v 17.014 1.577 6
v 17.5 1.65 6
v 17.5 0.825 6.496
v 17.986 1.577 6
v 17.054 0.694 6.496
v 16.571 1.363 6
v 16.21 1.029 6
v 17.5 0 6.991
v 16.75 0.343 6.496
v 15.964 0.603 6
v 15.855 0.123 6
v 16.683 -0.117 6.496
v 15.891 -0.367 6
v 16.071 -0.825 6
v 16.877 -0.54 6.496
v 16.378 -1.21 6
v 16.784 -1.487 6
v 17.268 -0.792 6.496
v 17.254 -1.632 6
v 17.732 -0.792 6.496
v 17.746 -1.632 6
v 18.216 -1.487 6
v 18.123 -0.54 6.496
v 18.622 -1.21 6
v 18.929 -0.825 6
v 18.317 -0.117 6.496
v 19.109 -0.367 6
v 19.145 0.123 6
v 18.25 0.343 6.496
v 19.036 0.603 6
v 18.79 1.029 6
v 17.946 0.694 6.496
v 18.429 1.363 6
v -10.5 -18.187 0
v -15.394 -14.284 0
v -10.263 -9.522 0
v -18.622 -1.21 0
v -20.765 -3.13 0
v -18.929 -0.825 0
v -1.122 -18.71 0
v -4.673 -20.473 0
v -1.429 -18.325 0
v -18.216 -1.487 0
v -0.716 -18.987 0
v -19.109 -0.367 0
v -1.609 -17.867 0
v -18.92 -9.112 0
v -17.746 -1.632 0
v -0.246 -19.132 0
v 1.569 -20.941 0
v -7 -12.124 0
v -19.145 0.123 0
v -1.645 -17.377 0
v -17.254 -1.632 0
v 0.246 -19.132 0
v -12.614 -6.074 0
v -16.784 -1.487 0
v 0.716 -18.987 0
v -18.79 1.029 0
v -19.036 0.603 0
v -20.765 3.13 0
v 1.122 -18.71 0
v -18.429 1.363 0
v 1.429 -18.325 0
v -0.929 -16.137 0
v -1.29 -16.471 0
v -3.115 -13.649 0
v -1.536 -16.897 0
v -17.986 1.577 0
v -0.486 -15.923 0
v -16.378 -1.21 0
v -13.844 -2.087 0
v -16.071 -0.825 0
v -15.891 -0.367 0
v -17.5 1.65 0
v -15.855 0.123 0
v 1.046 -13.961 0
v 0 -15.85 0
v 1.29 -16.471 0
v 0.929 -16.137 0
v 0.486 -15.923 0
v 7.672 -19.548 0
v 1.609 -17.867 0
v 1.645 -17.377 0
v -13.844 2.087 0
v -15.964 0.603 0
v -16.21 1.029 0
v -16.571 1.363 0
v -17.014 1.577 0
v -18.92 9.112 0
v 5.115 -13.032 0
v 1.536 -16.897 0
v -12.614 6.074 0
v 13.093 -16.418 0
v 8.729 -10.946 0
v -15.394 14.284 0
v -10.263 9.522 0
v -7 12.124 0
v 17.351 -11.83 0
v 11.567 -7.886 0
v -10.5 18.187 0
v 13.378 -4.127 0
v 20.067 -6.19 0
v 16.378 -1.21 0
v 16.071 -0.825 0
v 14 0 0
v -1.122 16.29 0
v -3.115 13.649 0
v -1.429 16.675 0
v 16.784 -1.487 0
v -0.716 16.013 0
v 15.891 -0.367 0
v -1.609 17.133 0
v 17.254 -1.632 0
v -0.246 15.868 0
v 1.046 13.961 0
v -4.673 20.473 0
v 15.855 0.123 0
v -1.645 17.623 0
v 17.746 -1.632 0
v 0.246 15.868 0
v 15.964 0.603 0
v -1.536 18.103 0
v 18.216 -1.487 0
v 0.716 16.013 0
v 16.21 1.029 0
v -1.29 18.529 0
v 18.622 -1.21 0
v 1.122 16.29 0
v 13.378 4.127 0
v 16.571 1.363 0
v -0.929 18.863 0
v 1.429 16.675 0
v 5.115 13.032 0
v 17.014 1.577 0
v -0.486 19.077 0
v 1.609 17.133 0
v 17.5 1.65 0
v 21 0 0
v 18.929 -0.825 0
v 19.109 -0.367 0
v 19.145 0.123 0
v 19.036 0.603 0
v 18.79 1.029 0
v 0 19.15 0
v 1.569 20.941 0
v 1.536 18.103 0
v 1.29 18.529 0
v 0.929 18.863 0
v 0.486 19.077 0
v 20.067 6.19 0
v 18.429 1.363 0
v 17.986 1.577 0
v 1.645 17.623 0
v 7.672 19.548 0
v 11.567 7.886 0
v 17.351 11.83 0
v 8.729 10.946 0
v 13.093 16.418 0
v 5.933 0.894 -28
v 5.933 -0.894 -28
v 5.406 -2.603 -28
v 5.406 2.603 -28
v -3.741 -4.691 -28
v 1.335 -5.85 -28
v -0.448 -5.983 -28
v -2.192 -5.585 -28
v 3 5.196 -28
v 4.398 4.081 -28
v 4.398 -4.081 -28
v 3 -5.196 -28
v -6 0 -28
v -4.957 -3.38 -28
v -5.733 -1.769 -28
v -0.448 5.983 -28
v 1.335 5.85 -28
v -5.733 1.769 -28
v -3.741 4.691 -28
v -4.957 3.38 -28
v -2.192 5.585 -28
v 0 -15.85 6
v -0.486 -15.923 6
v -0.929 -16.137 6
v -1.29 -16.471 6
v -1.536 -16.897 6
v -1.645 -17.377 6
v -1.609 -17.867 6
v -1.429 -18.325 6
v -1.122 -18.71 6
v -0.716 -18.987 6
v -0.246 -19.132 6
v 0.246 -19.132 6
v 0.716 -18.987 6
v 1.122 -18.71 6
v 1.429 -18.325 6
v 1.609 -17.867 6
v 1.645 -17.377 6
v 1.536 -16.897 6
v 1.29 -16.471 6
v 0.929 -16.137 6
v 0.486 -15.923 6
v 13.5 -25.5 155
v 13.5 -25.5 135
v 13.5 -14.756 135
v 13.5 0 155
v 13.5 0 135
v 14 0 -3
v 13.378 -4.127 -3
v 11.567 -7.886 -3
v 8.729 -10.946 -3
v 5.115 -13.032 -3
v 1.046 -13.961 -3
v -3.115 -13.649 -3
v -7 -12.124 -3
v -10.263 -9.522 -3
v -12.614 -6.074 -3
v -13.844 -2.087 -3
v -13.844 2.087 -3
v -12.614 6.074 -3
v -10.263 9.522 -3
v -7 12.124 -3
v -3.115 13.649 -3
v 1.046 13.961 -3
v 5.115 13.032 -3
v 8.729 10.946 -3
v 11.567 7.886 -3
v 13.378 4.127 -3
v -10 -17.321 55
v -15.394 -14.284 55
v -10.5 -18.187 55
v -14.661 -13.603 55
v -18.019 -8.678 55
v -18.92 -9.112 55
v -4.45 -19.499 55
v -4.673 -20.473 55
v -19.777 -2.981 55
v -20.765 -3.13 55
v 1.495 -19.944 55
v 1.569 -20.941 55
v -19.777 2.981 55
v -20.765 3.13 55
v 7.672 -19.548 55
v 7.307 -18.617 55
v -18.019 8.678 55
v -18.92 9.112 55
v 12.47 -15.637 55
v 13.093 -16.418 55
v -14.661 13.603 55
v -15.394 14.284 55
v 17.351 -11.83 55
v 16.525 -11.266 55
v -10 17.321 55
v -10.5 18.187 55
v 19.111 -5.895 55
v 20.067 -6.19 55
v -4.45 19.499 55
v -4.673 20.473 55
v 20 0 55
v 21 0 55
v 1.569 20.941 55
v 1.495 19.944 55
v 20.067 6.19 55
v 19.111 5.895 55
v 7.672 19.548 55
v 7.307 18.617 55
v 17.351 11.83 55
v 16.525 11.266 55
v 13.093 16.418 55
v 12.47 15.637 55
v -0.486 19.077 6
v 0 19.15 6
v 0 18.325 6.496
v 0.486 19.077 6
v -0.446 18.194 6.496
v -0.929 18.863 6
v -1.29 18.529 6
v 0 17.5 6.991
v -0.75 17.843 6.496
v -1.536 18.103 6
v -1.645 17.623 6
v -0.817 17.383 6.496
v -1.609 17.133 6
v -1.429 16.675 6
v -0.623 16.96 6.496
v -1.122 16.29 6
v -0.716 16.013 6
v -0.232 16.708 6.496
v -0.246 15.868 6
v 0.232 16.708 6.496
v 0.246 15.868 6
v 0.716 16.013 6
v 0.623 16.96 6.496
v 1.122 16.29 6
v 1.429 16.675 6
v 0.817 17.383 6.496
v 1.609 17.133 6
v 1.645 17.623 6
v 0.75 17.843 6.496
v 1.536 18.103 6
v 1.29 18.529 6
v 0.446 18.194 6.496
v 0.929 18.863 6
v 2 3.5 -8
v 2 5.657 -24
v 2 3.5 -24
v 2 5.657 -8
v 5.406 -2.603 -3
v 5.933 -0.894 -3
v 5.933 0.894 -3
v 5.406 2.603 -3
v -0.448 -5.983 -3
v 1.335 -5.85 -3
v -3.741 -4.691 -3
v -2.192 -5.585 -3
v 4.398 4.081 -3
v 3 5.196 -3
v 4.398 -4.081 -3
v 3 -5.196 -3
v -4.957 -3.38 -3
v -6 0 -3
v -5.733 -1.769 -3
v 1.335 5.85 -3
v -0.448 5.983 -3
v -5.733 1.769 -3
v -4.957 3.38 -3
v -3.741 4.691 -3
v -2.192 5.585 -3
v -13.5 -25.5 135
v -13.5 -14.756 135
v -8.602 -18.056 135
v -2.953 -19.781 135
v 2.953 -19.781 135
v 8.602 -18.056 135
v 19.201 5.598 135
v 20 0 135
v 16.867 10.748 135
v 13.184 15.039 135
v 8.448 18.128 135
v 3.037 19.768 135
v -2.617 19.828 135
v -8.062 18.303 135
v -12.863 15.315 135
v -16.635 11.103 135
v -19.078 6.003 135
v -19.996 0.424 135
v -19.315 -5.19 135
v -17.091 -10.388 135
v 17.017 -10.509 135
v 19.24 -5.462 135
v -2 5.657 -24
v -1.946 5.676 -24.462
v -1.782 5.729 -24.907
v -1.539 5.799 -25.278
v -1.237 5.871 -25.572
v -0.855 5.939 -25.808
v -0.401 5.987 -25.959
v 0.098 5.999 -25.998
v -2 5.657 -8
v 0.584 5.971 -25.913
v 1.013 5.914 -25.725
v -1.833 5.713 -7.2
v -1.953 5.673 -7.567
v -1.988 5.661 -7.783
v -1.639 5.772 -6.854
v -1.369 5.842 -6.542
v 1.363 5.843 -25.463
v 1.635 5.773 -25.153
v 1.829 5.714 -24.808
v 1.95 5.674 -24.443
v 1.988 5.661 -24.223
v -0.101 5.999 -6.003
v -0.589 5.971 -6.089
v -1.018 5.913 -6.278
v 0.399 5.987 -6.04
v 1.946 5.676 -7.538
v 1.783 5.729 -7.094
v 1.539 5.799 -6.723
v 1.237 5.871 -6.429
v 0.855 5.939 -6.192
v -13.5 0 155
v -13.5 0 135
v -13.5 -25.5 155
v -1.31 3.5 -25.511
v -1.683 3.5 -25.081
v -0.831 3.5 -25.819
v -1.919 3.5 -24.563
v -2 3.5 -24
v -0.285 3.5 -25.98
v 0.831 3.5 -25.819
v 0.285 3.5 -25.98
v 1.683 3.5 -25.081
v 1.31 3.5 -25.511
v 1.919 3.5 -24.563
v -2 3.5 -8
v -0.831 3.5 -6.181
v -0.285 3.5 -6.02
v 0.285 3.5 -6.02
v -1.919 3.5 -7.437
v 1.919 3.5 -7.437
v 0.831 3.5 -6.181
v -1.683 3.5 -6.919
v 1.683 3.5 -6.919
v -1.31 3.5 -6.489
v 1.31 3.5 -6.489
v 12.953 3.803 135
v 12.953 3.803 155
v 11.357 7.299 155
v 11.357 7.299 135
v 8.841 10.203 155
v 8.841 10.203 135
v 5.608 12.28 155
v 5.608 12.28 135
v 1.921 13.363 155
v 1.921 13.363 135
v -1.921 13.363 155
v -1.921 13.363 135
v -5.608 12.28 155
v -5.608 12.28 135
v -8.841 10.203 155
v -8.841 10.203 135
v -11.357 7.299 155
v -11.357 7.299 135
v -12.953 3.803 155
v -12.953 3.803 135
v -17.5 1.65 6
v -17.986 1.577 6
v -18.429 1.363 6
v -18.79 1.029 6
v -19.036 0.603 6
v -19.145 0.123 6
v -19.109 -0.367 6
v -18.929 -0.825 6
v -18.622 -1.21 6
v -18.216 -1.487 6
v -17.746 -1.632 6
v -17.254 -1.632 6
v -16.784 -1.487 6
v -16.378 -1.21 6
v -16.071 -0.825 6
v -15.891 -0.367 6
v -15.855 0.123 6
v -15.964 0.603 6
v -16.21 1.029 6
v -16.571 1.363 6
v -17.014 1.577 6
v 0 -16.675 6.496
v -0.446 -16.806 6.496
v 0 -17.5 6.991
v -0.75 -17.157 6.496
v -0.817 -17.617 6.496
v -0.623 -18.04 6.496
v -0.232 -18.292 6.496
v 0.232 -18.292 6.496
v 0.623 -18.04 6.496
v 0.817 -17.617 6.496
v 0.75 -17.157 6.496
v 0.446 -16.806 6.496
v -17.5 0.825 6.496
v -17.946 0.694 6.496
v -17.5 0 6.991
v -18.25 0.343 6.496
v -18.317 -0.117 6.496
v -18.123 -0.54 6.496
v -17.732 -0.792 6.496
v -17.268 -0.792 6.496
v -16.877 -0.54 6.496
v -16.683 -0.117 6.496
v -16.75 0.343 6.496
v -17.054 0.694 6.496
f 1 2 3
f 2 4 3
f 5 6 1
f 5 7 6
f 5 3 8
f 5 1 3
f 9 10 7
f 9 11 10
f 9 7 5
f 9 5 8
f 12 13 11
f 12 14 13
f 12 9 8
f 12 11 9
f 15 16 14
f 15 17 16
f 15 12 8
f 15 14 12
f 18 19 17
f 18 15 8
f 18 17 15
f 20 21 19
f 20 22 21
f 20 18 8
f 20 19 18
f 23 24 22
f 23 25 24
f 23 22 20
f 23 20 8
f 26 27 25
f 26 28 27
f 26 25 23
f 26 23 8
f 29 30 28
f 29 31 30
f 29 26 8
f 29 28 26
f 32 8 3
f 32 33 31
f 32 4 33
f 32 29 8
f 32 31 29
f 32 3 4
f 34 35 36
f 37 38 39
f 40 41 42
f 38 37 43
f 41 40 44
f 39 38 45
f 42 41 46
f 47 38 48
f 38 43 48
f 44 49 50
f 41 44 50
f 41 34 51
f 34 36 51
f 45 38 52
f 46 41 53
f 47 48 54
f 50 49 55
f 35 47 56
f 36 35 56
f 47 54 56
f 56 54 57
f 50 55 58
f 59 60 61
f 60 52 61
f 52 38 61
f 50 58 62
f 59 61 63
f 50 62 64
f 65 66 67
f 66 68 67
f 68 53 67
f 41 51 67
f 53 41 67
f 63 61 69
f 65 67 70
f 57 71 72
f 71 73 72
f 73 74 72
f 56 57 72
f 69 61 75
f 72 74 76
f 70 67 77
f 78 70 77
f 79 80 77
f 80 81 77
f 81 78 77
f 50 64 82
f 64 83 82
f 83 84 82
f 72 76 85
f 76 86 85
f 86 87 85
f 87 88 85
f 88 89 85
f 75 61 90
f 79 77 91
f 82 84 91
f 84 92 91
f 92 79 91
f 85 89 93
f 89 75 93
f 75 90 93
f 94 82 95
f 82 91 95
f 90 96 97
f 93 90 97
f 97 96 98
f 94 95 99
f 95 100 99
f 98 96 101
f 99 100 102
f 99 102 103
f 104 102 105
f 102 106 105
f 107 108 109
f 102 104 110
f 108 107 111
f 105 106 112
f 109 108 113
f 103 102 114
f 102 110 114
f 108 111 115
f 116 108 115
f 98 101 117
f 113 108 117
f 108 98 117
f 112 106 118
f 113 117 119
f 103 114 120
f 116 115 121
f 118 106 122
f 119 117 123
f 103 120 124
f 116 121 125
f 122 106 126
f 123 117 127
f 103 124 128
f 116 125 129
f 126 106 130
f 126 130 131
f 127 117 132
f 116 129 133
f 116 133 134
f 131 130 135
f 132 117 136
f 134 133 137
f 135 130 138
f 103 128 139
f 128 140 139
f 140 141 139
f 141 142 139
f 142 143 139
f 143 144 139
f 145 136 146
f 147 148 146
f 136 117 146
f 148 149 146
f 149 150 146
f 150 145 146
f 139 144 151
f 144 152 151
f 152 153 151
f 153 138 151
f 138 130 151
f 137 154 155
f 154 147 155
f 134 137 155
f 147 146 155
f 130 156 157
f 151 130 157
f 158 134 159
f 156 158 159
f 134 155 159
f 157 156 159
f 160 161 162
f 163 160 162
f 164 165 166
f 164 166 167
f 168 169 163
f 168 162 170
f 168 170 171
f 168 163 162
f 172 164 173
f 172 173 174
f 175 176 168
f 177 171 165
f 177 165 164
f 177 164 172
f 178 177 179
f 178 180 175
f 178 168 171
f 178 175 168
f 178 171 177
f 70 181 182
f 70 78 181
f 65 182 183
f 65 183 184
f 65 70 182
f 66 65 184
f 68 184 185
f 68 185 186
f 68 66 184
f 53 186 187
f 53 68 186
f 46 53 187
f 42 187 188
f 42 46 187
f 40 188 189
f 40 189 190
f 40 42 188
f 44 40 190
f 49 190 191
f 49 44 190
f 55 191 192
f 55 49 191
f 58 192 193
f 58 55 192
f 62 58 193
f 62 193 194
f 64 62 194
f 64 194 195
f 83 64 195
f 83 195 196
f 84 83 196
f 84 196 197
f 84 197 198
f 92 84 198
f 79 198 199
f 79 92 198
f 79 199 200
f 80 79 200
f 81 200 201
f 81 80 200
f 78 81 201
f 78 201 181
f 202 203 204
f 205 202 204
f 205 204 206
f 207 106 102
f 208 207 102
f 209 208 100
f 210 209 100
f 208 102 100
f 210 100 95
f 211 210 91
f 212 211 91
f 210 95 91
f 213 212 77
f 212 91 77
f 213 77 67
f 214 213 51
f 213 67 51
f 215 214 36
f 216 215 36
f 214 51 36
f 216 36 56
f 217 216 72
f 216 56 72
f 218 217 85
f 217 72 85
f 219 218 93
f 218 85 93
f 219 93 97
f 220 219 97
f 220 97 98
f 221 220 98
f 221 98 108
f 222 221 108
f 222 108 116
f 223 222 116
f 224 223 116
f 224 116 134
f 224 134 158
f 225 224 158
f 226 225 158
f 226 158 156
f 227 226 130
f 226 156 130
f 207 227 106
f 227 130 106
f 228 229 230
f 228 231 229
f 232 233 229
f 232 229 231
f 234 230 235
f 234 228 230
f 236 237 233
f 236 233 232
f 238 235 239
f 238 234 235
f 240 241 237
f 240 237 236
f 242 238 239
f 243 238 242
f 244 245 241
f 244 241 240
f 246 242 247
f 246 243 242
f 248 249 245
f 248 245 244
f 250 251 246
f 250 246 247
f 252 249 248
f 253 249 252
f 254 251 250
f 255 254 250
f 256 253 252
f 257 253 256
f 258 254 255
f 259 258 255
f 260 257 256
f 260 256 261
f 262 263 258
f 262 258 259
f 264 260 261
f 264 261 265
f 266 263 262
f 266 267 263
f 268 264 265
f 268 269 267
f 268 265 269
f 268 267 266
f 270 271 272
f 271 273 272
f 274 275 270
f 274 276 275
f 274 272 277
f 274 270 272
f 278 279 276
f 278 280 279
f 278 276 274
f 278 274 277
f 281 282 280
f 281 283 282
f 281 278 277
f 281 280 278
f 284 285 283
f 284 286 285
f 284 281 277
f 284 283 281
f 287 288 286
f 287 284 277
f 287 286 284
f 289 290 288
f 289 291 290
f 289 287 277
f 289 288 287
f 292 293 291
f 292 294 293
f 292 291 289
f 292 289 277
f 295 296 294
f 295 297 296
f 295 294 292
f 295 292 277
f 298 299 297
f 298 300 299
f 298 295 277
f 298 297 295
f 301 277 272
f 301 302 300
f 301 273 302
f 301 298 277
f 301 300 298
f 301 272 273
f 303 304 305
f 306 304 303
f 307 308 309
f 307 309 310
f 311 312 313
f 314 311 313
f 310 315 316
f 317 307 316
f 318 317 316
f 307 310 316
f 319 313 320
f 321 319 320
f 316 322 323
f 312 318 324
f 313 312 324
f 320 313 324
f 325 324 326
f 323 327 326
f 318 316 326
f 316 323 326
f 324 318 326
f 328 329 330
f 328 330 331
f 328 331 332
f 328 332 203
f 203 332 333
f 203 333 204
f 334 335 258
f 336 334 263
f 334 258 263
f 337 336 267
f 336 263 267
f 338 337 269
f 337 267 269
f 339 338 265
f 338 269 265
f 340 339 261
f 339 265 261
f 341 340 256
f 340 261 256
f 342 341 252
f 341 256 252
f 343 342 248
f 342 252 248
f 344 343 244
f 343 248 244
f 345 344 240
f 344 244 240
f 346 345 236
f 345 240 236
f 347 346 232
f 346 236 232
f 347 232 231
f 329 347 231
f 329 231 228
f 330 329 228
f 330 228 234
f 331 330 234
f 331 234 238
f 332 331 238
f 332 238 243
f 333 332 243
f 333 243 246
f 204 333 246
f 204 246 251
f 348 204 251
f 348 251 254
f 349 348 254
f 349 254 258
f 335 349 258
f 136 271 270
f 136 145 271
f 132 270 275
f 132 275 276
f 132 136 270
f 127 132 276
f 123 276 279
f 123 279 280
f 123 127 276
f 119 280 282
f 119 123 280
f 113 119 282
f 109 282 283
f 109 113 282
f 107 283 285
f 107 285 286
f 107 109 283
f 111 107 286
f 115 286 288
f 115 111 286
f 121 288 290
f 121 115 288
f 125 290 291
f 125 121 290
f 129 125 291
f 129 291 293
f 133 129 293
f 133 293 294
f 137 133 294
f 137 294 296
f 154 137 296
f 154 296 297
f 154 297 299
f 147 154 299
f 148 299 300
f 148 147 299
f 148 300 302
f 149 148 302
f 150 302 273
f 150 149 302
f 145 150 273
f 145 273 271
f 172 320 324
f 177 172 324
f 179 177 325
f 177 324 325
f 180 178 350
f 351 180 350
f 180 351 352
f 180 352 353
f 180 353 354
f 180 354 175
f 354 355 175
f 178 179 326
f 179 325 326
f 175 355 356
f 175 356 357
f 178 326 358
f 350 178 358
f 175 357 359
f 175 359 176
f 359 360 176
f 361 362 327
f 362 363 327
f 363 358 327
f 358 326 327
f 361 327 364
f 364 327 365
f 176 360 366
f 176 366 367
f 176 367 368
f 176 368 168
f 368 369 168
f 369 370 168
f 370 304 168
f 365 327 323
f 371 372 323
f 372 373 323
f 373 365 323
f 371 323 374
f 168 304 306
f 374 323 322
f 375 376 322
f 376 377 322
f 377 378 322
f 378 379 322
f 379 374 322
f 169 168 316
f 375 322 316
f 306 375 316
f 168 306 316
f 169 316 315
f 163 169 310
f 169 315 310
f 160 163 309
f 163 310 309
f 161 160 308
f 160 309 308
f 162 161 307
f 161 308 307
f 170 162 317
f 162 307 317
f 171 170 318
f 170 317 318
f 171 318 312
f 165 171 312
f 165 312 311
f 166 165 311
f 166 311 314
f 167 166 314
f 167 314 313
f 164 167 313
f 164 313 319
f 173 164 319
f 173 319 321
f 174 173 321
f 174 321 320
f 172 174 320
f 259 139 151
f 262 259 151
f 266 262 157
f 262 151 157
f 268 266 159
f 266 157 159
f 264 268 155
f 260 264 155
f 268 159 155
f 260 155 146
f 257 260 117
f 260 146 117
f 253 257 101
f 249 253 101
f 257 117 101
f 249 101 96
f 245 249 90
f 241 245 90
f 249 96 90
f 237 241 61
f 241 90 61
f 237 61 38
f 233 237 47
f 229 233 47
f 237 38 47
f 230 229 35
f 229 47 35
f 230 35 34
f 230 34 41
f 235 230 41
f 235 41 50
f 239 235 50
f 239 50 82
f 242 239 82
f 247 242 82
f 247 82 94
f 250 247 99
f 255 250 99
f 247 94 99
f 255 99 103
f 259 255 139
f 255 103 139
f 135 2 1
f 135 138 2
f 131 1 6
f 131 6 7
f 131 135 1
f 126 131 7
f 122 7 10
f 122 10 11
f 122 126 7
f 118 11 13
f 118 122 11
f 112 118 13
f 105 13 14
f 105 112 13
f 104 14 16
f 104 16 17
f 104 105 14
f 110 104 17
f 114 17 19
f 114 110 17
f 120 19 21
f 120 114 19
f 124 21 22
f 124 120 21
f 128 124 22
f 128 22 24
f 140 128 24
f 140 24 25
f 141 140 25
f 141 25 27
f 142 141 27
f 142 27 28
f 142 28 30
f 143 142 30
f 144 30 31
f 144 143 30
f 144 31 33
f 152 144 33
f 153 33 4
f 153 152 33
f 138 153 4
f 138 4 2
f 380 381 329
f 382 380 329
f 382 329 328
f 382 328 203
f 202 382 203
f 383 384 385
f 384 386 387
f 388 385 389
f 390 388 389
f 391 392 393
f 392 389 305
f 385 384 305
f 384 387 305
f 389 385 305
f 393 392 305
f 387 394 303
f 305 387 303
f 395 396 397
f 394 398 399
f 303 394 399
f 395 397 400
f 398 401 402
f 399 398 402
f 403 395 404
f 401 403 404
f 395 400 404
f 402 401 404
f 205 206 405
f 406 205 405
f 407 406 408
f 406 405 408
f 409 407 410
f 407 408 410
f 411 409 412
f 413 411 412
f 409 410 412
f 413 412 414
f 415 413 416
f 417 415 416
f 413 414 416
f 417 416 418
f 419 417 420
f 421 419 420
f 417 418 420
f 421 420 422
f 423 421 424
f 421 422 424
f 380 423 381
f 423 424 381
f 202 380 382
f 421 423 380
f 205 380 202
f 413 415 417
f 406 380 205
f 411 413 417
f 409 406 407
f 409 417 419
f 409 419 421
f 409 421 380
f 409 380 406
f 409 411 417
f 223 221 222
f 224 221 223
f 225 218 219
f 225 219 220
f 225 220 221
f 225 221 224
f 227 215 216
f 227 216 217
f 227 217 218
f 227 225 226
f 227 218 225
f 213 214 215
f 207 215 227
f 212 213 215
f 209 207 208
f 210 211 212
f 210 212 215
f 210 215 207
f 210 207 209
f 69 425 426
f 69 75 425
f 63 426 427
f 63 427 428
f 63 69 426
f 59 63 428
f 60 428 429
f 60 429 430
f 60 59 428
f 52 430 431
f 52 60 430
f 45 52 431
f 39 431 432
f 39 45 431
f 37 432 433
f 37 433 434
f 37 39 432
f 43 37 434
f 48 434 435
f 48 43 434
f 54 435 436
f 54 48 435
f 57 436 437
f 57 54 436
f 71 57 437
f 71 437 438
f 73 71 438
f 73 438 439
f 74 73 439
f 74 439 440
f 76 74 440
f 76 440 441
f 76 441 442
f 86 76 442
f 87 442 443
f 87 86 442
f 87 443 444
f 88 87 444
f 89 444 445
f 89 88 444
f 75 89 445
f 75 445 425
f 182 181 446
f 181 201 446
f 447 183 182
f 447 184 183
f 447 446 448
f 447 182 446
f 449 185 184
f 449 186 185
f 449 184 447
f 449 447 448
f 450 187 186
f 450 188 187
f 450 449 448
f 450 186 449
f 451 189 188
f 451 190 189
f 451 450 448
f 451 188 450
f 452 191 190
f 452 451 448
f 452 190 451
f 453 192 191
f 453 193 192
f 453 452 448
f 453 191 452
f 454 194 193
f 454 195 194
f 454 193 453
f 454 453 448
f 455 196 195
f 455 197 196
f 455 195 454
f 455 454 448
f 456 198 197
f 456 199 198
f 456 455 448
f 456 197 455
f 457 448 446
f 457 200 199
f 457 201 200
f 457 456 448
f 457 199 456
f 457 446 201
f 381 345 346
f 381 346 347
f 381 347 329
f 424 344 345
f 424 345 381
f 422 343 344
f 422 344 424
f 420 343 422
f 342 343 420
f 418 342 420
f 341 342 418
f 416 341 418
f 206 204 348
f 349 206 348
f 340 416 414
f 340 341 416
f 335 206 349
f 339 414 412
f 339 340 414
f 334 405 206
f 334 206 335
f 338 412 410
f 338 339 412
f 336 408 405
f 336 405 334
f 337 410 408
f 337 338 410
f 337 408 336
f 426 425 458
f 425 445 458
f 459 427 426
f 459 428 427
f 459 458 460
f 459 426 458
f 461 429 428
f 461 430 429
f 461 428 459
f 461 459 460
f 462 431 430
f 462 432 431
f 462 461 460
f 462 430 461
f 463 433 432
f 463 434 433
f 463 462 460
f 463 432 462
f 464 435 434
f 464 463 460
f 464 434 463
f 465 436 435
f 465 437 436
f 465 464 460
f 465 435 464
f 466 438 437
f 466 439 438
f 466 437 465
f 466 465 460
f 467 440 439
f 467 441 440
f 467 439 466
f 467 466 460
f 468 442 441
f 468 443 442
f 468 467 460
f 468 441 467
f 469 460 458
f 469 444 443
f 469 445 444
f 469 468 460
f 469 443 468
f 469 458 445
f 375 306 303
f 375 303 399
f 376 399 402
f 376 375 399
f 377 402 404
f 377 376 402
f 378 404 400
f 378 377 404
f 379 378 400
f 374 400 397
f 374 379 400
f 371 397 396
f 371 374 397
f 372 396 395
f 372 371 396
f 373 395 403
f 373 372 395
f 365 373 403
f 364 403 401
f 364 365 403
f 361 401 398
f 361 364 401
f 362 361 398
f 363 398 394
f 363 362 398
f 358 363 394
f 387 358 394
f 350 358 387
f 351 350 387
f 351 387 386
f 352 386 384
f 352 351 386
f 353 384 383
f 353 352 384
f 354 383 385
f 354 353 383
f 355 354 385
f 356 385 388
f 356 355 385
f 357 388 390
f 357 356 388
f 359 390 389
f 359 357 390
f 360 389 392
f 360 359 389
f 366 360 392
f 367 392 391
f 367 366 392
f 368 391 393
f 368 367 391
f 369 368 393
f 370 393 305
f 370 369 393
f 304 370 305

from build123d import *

# Parameters (mm, degrees)
SKETCH_1_R                  = 21
EXTRUDE_356_DEPTH           = 55
SKETCH_2_R                  = 20
EXTRUDE_456_DEPTH           = 80
EXTRUDE_680_DEPTH           = 20
SKETCH_5_R                  = 14
EXTRUDE_800_DEPTH           = 3
SKETCH_4_R                  = 6
EXTRUDE_922_DEPTH           = 25
CUT_EXTRUDE_1_DEPTH         = 2.5
HOLE_WIZARD_M4_1_AT_2_COUNT = 2
HOLE_WIZARD_M4_1_AT_2_PITCH = 24.748737342
HOLE_WIZARD_M4_1_AT_3_COUNT = 2
HOLE_WIZARD_M4_1_AT_3_PITCH = 35
HOLE_WIZARD_M4_1_AT_4_COUNT = 2
HOLE_WIZARD_M4_1_AT_4_PITCH = 24.748737342


with BuildPart() as part:
    # 草图1 → Extrude 356 (new body)
    with BuildSketch(Plane.XY):
        Circle(SKETCH_1_R)
    extrude(amount=EXTRUDE_356_DEPTH)

    # 草图2 → Extrude 456 (add)
    with BuildSketch(Plane.XY.offset(55)):
        Circle(SKETCH_2_R)
    extrude(amount=EXTRUDE_456_DEPTH)

    # 草图3 → Extrude 680 (add)
    with BuildSketch(Plane.XY.offset(135)):
        with BuildLine():
            Line((-13.5, -25.5), (13.5, -25.5))
            Line((13.5, -25.5), (13.5, 0))
            ThreePointArc((13.5, 0), (0, 13.5), (-13.5, 0))
            Line((-13.5, 0), (-13.5, -25.5))
        make_face()
    extrude(amount=EXTRUDE_680_DEPTH)

    # 草图5 → Extrude 800 (add)
    with BuildSketch(Plane(origin=(0, 0, 0), x_dir=(-1, 0, 0), z_dir=(0, 0, -1))):
        with Locations(Location((0, 0, 0), (0, 0, 180))):
            Circle(SKETCH_5_R)
    extrude(amount=EXTRUDE_800_DEPTH)

    # 草图7 → M4 螺纹孔1 (revolve, cut)
    with BuildSketch(Plane(origin=(0, 17.5, 0), x_dir=(0, 1, 0), z_dir=(1, 0, 0))):
        Polygon((0, 0), (0, 6.991420021), (1.65, 6), (1.65, 0), align=None)
    hole_wizard_m4_1 = revolve(axis=Axis((0, 17.5, -6.35), (0, 0, 1)), mode=Mode.SUBTRACT)

    # M4 螺纹孔1 at 2: M4 螺纹孔1 ×2
    with Locations(*[Vector(-0.7071067811865575, -0.7071067811865376, 0) * (i * HOLE_WIZARD_M4_1_AT_2_PITCH) for i in range(1, HOLE_WIZARD_M4_1_AT_2_COUNT)]):
        add(hole_wizard_m4_1, mode=Mode.SUBTRACT)

    # M4 螺纹孔1 at 3: M4 螺纹孔1 ×2
    with Locations(*[(0, -i * HOLE_WIZARD_M4_1_AT_3_PITCH, 0) for i in range(1, HOLE_WIZARD_M4_1_AT_3_COUNT)]):
        add(hole_wizard_m4_1, mode=Mode.SUBTRACT)

    # M4 螺纹孔1 at 4: M4 螺纹孔1 ×2
    with Locations(*[Vector(0.7071067811865376, -0.7071067811865576, 0) * (i * HOLE_WIZARD_M4_1_AT_4_PITCH) for i in range(1, HOLE_WIZARD_M4_1_AT_4_COUNT)]):
        add(hole_wizard_m4_1, mode=Mode.SUBTRACT)


with BuildPart() as body_2:
    # 草图4 → Extrude 922 (new body)
    with BuildSketch(Plane(origin=(0, 0, -3), x_dir=(-1, 0, 0), z_dir=(0, 0, -1))):
        Circle(SKETCH_4_R)
    extrude(amount=EXTRUDE_922_DEPTH)

    # 草图6 → 切除-拉伸1 (cut)
    with BuildSketch(Plane(origin=(0, 6, 0), x_dir=(-1, 0, 0), z_dir=(0, 1, 0))):
        with BuildLine():
            Line((-2, -24), (-2, -8))
            ThreePointArc((-2, -8), (0, -6), (2, -8))
            Line((2, -8), (2, -24))
            ThreePointArc((2, -24), (0, -26), (-2, -24))
        make_face()
    extrude(amount=-CUT_EXTRUDE_1_DEPTH, mode=Mode.SUBTRACT)


solid = Compound([part.part, body_2.part])
